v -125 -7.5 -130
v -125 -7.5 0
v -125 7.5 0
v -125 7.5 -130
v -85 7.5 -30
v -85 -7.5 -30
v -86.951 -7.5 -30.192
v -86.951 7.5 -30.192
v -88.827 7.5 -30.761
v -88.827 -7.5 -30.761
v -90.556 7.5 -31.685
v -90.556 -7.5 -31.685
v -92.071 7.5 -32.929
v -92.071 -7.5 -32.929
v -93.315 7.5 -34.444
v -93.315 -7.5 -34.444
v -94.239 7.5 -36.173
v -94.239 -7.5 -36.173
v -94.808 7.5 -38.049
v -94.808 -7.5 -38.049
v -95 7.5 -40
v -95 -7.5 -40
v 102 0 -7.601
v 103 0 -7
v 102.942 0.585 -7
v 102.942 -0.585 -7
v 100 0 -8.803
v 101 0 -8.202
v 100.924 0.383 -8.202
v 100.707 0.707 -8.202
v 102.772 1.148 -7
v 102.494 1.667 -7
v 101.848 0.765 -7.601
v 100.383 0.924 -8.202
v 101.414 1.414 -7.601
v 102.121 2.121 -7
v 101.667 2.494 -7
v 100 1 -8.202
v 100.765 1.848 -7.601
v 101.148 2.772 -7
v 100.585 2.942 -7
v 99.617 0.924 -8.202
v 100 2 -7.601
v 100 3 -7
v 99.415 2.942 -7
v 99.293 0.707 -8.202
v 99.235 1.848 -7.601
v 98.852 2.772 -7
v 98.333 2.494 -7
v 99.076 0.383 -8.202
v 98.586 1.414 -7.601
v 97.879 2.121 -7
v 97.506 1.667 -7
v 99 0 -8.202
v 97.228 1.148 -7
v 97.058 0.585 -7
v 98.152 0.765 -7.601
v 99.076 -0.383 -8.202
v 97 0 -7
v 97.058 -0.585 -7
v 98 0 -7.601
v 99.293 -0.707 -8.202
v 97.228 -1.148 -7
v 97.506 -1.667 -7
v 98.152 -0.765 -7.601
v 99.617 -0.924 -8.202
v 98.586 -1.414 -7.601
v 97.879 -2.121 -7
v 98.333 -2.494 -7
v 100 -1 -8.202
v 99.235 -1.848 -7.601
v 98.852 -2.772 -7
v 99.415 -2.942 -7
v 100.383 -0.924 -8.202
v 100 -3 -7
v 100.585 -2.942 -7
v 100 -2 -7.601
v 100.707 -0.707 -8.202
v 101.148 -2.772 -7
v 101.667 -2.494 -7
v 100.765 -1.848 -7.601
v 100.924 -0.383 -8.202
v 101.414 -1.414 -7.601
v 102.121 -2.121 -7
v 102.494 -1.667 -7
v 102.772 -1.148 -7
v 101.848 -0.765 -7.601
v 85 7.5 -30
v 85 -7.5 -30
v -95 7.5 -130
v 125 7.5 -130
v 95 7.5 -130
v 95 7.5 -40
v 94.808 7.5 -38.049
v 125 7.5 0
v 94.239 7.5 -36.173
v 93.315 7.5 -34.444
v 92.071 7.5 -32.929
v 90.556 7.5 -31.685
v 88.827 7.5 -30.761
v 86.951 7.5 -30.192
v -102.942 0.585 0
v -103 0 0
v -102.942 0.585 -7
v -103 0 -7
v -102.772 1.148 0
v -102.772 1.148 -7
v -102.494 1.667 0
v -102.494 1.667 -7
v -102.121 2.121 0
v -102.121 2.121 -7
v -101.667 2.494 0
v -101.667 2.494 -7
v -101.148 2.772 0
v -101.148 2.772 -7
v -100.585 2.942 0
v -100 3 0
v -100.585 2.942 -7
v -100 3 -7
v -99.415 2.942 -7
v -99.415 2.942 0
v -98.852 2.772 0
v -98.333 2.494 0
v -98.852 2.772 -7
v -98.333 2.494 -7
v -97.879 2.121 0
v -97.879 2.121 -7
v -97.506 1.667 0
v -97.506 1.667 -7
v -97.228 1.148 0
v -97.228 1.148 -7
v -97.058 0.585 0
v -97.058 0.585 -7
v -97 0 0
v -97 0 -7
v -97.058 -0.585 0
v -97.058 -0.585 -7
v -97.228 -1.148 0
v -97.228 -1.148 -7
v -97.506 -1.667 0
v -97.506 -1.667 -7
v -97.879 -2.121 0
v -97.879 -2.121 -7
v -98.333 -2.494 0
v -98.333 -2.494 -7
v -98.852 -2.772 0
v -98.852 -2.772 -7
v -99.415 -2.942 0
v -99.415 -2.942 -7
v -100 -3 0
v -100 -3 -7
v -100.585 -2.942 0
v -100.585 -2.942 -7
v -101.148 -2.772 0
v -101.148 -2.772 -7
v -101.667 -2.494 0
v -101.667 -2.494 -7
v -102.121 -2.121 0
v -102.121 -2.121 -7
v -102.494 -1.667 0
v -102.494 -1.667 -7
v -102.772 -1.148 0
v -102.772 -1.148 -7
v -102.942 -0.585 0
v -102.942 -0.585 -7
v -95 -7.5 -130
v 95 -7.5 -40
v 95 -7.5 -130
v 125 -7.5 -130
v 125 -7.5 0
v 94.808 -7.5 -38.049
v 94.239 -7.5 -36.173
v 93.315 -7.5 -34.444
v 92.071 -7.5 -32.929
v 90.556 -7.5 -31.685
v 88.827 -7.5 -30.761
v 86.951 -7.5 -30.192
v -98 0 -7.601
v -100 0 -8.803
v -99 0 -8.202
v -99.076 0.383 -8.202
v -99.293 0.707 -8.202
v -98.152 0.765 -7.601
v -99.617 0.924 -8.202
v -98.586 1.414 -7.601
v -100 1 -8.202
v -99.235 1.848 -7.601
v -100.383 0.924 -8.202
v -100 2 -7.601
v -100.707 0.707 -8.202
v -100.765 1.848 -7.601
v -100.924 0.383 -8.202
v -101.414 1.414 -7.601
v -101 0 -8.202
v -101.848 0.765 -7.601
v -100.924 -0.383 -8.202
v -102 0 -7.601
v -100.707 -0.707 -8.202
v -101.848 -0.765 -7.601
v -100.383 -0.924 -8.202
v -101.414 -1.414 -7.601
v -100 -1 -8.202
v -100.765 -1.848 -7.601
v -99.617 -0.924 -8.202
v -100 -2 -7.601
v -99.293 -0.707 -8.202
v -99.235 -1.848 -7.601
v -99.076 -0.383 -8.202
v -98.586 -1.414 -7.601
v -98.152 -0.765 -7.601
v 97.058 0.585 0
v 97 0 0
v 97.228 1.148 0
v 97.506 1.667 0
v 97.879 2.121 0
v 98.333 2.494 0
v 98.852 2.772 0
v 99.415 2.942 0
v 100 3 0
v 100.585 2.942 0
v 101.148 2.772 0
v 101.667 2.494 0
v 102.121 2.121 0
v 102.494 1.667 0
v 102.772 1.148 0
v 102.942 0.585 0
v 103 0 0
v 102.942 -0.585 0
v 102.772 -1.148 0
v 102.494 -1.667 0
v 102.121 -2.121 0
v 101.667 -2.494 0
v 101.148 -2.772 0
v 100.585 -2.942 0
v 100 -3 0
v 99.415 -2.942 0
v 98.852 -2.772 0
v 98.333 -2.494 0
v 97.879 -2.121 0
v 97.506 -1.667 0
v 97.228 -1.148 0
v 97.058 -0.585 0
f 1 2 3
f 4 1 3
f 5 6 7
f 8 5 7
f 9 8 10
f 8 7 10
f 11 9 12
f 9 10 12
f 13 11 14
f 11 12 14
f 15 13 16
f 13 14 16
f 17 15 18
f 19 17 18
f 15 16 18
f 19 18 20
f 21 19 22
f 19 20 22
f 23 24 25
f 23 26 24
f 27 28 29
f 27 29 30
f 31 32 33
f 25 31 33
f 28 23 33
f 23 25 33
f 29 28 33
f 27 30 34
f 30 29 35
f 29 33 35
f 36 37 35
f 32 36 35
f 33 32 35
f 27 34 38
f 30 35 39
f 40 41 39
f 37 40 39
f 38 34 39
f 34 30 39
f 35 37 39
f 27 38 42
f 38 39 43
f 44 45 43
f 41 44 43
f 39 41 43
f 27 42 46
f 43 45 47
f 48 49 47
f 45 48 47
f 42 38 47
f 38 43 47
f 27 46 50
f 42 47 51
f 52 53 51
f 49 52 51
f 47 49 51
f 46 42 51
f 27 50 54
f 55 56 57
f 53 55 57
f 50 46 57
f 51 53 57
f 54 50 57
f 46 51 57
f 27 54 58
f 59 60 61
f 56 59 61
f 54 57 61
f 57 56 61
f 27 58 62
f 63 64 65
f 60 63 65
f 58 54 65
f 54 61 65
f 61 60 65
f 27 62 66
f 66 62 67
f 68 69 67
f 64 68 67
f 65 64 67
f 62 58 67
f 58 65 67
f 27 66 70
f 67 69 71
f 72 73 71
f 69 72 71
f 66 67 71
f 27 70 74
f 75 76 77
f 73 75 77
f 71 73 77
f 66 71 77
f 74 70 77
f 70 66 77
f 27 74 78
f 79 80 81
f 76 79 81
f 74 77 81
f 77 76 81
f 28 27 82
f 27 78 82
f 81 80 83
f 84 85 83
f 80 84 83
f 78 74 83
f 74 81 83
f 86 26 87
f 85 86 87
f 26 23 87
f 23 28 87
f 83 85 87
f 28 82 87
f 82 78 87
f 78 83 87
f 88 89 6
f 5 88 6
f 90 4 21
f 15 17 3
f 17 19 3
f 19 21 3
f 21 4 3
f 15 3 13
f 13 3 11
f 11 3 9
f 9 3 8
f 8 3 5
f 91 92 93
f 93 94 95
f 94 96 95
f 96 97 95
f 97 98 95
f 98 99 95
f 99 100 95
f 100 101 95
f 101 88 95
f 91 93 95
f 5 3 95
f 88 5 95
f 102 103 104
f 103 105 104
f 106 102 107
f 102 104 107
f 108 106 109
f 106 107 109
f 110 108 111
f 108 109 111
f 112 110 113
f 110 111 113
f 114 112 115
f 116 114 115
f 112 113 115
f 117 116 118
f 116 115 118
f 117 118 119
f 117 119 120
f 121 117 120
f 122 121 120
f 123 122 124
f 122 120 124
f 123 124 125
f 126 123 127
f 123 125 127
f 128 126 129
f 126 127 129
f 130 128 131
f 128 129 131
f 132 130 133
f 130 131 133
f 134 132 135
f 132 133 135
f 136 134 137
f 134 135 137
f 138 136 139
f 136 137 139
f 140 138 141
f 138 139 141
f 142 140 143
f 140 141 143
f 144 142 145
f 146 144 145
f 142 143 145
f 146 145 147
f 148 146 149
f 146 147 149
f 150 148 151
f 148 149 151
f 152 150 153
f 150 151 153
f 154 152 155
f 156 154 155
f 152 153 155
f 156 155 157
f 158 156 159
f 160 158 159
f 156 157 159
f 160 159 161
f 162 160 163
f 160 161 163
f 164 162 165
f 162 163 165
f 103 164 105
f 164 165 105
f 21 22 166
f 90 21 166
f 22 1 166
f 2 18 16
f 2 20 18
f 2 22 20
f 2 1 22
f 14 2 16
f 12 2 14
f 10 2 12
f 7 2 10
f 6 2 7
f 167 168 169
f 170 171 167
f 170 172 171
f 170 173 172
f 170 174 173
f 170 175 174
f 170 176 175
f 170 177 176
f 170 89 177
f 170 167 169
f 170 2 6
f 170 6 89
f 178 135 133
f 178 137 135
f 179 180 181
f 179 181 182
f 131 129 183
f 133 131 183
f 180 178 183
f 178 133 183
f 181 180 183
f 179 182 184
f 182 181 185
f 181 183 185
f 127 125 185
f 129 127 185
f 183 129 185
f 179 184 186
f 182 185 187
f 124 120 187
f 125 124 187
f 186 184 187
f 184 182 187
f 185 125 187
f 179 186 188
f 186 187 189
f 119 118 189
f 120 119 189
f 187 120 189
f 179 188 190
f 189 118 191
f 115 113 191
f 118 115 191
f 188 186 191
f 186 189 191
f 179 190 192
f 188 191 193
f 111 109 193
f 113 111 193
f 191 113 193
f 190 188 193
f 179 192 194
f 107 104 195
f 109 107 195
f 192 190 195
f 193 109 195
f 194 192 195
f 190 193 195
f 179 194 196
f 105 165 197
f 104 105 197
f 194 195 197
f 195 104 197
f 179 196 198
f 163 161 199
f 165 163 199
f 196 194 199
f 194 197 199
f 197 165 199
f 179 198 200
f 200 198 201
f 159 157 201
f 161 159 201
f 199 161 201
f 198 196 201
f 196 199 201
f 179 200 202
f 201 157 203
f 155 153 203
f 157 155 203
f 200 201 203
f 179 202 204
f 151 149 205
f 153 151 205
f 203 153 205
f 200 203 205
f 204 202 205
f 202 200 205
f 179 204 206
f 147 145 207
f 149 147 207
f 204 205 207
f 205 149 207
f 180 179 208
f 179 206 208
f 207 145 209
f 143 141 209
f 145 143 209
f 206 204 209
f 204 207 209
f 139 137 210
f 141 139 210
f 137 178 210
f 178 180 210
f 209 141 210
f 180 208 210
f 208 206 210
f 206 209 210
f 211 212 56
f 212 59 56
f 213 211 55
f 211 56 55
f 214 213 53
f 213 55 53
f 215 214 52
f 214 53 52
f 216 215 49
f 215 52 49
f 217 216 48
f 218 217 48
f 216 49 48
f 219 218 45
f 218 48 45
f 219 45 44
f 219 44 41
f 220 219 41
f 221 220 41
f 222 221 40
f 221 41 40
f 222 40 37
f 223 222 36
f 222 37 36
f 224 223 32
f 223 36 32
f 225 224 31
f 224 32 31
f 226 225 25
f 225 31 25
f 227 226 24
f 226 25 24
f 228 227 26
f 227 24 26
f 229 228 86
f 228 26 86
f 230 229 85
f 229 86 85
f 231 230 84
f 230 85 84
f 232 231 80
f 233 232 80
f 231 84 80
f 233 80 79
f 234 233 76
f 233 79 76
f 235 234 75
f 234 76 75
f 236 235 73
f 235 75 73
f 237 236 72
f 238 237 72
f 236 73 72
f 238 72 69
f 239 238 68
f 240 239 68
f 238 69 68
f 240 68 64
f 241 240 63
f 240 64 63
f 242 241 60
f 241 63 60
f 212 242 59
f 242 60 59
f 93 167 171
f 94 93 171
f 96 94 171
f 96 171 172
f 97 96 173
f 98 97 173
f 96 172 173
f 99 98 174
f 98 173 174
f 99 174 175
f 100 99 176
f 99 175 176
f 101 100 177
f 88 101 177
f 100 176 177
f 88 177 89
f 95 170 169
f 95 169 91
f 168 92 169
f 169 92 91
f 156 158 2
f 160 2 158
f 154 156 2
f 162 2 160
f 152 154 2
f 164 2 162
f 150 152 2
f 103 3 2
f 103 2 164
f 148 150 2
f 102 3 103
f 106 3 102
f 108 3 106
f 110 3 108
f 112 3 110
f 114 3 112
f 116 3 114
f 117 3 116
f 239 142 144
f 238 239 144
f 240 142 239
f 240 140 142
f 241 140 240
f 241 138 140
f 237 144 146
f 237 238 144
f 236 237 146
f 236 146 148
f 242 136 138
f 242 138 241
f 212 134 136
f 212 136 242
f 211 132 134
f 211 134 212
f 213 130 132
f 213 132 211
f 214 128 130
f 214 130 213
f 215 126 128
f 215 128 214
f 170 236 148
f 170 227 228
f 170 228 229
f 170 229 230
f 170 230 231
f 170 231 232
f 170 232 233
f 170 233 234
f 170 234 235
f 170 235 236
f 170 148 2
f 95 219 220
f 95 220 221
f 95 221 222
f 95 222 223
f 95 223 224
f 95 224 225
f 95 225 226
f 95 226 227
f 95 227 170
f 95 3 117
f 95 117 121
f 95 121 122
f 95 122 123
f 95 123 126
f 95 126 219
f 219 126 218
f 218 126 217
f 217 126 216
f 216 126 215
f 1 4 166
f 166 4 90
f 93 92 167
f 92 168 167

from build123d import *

# Parameters (mm, degrees)
F0_W     = 250
F0_H     = 15
F1_DEPTH = 130
F2_D     = 6
F2_DEPTH = 7
F2_TIP   = 1.8025818571
F4_DEPTH = 12.5


with BuildPart() as f1:
    # F0 (on Top) → F1 (new body)
    with BuildSketch(Plane.XY):
        Rectangle(F0_W, F0_H)
    extrude(amount=-F1_DEPTH)

    # F2
    with Locations(Plane.XY):
        with Locations((-100, 0), (100, 0)):
            Hole(F2_D / 2, depth=F2_DEPTH)
            with Locations((0, 0, -(F2_DEPTH + F2_TIP / 2))):  # 118° drill point
                Cone(0, F2_D / 2, F2_TIP, mode=Mode.SUBTRACT)

    # F3 (on Front) → F4 (cut, symmetric)
    with BuildSketch(Plane.XZ):
        with BuildLine():
            Line((-95, -177.2061562841), (95, -177.2061562841))
            Line((95, -177.2061562841), (95, -40))
            ThreePointArc((95, -40), (92.0710678119, -32.9289321881), (85, -30))
            Line((85, -30), (-85, -30))
            ThreePointArc((-85, -30), (-92.0710678119, -32.9289321881), (-95, -40))
            Line((-95, -40), (-95, -177.2061562841))
        make_face()
    extrude(amount=F4_DEPTH, both=True, mode=Mode.SUBTRACT)


solid = f1.part
